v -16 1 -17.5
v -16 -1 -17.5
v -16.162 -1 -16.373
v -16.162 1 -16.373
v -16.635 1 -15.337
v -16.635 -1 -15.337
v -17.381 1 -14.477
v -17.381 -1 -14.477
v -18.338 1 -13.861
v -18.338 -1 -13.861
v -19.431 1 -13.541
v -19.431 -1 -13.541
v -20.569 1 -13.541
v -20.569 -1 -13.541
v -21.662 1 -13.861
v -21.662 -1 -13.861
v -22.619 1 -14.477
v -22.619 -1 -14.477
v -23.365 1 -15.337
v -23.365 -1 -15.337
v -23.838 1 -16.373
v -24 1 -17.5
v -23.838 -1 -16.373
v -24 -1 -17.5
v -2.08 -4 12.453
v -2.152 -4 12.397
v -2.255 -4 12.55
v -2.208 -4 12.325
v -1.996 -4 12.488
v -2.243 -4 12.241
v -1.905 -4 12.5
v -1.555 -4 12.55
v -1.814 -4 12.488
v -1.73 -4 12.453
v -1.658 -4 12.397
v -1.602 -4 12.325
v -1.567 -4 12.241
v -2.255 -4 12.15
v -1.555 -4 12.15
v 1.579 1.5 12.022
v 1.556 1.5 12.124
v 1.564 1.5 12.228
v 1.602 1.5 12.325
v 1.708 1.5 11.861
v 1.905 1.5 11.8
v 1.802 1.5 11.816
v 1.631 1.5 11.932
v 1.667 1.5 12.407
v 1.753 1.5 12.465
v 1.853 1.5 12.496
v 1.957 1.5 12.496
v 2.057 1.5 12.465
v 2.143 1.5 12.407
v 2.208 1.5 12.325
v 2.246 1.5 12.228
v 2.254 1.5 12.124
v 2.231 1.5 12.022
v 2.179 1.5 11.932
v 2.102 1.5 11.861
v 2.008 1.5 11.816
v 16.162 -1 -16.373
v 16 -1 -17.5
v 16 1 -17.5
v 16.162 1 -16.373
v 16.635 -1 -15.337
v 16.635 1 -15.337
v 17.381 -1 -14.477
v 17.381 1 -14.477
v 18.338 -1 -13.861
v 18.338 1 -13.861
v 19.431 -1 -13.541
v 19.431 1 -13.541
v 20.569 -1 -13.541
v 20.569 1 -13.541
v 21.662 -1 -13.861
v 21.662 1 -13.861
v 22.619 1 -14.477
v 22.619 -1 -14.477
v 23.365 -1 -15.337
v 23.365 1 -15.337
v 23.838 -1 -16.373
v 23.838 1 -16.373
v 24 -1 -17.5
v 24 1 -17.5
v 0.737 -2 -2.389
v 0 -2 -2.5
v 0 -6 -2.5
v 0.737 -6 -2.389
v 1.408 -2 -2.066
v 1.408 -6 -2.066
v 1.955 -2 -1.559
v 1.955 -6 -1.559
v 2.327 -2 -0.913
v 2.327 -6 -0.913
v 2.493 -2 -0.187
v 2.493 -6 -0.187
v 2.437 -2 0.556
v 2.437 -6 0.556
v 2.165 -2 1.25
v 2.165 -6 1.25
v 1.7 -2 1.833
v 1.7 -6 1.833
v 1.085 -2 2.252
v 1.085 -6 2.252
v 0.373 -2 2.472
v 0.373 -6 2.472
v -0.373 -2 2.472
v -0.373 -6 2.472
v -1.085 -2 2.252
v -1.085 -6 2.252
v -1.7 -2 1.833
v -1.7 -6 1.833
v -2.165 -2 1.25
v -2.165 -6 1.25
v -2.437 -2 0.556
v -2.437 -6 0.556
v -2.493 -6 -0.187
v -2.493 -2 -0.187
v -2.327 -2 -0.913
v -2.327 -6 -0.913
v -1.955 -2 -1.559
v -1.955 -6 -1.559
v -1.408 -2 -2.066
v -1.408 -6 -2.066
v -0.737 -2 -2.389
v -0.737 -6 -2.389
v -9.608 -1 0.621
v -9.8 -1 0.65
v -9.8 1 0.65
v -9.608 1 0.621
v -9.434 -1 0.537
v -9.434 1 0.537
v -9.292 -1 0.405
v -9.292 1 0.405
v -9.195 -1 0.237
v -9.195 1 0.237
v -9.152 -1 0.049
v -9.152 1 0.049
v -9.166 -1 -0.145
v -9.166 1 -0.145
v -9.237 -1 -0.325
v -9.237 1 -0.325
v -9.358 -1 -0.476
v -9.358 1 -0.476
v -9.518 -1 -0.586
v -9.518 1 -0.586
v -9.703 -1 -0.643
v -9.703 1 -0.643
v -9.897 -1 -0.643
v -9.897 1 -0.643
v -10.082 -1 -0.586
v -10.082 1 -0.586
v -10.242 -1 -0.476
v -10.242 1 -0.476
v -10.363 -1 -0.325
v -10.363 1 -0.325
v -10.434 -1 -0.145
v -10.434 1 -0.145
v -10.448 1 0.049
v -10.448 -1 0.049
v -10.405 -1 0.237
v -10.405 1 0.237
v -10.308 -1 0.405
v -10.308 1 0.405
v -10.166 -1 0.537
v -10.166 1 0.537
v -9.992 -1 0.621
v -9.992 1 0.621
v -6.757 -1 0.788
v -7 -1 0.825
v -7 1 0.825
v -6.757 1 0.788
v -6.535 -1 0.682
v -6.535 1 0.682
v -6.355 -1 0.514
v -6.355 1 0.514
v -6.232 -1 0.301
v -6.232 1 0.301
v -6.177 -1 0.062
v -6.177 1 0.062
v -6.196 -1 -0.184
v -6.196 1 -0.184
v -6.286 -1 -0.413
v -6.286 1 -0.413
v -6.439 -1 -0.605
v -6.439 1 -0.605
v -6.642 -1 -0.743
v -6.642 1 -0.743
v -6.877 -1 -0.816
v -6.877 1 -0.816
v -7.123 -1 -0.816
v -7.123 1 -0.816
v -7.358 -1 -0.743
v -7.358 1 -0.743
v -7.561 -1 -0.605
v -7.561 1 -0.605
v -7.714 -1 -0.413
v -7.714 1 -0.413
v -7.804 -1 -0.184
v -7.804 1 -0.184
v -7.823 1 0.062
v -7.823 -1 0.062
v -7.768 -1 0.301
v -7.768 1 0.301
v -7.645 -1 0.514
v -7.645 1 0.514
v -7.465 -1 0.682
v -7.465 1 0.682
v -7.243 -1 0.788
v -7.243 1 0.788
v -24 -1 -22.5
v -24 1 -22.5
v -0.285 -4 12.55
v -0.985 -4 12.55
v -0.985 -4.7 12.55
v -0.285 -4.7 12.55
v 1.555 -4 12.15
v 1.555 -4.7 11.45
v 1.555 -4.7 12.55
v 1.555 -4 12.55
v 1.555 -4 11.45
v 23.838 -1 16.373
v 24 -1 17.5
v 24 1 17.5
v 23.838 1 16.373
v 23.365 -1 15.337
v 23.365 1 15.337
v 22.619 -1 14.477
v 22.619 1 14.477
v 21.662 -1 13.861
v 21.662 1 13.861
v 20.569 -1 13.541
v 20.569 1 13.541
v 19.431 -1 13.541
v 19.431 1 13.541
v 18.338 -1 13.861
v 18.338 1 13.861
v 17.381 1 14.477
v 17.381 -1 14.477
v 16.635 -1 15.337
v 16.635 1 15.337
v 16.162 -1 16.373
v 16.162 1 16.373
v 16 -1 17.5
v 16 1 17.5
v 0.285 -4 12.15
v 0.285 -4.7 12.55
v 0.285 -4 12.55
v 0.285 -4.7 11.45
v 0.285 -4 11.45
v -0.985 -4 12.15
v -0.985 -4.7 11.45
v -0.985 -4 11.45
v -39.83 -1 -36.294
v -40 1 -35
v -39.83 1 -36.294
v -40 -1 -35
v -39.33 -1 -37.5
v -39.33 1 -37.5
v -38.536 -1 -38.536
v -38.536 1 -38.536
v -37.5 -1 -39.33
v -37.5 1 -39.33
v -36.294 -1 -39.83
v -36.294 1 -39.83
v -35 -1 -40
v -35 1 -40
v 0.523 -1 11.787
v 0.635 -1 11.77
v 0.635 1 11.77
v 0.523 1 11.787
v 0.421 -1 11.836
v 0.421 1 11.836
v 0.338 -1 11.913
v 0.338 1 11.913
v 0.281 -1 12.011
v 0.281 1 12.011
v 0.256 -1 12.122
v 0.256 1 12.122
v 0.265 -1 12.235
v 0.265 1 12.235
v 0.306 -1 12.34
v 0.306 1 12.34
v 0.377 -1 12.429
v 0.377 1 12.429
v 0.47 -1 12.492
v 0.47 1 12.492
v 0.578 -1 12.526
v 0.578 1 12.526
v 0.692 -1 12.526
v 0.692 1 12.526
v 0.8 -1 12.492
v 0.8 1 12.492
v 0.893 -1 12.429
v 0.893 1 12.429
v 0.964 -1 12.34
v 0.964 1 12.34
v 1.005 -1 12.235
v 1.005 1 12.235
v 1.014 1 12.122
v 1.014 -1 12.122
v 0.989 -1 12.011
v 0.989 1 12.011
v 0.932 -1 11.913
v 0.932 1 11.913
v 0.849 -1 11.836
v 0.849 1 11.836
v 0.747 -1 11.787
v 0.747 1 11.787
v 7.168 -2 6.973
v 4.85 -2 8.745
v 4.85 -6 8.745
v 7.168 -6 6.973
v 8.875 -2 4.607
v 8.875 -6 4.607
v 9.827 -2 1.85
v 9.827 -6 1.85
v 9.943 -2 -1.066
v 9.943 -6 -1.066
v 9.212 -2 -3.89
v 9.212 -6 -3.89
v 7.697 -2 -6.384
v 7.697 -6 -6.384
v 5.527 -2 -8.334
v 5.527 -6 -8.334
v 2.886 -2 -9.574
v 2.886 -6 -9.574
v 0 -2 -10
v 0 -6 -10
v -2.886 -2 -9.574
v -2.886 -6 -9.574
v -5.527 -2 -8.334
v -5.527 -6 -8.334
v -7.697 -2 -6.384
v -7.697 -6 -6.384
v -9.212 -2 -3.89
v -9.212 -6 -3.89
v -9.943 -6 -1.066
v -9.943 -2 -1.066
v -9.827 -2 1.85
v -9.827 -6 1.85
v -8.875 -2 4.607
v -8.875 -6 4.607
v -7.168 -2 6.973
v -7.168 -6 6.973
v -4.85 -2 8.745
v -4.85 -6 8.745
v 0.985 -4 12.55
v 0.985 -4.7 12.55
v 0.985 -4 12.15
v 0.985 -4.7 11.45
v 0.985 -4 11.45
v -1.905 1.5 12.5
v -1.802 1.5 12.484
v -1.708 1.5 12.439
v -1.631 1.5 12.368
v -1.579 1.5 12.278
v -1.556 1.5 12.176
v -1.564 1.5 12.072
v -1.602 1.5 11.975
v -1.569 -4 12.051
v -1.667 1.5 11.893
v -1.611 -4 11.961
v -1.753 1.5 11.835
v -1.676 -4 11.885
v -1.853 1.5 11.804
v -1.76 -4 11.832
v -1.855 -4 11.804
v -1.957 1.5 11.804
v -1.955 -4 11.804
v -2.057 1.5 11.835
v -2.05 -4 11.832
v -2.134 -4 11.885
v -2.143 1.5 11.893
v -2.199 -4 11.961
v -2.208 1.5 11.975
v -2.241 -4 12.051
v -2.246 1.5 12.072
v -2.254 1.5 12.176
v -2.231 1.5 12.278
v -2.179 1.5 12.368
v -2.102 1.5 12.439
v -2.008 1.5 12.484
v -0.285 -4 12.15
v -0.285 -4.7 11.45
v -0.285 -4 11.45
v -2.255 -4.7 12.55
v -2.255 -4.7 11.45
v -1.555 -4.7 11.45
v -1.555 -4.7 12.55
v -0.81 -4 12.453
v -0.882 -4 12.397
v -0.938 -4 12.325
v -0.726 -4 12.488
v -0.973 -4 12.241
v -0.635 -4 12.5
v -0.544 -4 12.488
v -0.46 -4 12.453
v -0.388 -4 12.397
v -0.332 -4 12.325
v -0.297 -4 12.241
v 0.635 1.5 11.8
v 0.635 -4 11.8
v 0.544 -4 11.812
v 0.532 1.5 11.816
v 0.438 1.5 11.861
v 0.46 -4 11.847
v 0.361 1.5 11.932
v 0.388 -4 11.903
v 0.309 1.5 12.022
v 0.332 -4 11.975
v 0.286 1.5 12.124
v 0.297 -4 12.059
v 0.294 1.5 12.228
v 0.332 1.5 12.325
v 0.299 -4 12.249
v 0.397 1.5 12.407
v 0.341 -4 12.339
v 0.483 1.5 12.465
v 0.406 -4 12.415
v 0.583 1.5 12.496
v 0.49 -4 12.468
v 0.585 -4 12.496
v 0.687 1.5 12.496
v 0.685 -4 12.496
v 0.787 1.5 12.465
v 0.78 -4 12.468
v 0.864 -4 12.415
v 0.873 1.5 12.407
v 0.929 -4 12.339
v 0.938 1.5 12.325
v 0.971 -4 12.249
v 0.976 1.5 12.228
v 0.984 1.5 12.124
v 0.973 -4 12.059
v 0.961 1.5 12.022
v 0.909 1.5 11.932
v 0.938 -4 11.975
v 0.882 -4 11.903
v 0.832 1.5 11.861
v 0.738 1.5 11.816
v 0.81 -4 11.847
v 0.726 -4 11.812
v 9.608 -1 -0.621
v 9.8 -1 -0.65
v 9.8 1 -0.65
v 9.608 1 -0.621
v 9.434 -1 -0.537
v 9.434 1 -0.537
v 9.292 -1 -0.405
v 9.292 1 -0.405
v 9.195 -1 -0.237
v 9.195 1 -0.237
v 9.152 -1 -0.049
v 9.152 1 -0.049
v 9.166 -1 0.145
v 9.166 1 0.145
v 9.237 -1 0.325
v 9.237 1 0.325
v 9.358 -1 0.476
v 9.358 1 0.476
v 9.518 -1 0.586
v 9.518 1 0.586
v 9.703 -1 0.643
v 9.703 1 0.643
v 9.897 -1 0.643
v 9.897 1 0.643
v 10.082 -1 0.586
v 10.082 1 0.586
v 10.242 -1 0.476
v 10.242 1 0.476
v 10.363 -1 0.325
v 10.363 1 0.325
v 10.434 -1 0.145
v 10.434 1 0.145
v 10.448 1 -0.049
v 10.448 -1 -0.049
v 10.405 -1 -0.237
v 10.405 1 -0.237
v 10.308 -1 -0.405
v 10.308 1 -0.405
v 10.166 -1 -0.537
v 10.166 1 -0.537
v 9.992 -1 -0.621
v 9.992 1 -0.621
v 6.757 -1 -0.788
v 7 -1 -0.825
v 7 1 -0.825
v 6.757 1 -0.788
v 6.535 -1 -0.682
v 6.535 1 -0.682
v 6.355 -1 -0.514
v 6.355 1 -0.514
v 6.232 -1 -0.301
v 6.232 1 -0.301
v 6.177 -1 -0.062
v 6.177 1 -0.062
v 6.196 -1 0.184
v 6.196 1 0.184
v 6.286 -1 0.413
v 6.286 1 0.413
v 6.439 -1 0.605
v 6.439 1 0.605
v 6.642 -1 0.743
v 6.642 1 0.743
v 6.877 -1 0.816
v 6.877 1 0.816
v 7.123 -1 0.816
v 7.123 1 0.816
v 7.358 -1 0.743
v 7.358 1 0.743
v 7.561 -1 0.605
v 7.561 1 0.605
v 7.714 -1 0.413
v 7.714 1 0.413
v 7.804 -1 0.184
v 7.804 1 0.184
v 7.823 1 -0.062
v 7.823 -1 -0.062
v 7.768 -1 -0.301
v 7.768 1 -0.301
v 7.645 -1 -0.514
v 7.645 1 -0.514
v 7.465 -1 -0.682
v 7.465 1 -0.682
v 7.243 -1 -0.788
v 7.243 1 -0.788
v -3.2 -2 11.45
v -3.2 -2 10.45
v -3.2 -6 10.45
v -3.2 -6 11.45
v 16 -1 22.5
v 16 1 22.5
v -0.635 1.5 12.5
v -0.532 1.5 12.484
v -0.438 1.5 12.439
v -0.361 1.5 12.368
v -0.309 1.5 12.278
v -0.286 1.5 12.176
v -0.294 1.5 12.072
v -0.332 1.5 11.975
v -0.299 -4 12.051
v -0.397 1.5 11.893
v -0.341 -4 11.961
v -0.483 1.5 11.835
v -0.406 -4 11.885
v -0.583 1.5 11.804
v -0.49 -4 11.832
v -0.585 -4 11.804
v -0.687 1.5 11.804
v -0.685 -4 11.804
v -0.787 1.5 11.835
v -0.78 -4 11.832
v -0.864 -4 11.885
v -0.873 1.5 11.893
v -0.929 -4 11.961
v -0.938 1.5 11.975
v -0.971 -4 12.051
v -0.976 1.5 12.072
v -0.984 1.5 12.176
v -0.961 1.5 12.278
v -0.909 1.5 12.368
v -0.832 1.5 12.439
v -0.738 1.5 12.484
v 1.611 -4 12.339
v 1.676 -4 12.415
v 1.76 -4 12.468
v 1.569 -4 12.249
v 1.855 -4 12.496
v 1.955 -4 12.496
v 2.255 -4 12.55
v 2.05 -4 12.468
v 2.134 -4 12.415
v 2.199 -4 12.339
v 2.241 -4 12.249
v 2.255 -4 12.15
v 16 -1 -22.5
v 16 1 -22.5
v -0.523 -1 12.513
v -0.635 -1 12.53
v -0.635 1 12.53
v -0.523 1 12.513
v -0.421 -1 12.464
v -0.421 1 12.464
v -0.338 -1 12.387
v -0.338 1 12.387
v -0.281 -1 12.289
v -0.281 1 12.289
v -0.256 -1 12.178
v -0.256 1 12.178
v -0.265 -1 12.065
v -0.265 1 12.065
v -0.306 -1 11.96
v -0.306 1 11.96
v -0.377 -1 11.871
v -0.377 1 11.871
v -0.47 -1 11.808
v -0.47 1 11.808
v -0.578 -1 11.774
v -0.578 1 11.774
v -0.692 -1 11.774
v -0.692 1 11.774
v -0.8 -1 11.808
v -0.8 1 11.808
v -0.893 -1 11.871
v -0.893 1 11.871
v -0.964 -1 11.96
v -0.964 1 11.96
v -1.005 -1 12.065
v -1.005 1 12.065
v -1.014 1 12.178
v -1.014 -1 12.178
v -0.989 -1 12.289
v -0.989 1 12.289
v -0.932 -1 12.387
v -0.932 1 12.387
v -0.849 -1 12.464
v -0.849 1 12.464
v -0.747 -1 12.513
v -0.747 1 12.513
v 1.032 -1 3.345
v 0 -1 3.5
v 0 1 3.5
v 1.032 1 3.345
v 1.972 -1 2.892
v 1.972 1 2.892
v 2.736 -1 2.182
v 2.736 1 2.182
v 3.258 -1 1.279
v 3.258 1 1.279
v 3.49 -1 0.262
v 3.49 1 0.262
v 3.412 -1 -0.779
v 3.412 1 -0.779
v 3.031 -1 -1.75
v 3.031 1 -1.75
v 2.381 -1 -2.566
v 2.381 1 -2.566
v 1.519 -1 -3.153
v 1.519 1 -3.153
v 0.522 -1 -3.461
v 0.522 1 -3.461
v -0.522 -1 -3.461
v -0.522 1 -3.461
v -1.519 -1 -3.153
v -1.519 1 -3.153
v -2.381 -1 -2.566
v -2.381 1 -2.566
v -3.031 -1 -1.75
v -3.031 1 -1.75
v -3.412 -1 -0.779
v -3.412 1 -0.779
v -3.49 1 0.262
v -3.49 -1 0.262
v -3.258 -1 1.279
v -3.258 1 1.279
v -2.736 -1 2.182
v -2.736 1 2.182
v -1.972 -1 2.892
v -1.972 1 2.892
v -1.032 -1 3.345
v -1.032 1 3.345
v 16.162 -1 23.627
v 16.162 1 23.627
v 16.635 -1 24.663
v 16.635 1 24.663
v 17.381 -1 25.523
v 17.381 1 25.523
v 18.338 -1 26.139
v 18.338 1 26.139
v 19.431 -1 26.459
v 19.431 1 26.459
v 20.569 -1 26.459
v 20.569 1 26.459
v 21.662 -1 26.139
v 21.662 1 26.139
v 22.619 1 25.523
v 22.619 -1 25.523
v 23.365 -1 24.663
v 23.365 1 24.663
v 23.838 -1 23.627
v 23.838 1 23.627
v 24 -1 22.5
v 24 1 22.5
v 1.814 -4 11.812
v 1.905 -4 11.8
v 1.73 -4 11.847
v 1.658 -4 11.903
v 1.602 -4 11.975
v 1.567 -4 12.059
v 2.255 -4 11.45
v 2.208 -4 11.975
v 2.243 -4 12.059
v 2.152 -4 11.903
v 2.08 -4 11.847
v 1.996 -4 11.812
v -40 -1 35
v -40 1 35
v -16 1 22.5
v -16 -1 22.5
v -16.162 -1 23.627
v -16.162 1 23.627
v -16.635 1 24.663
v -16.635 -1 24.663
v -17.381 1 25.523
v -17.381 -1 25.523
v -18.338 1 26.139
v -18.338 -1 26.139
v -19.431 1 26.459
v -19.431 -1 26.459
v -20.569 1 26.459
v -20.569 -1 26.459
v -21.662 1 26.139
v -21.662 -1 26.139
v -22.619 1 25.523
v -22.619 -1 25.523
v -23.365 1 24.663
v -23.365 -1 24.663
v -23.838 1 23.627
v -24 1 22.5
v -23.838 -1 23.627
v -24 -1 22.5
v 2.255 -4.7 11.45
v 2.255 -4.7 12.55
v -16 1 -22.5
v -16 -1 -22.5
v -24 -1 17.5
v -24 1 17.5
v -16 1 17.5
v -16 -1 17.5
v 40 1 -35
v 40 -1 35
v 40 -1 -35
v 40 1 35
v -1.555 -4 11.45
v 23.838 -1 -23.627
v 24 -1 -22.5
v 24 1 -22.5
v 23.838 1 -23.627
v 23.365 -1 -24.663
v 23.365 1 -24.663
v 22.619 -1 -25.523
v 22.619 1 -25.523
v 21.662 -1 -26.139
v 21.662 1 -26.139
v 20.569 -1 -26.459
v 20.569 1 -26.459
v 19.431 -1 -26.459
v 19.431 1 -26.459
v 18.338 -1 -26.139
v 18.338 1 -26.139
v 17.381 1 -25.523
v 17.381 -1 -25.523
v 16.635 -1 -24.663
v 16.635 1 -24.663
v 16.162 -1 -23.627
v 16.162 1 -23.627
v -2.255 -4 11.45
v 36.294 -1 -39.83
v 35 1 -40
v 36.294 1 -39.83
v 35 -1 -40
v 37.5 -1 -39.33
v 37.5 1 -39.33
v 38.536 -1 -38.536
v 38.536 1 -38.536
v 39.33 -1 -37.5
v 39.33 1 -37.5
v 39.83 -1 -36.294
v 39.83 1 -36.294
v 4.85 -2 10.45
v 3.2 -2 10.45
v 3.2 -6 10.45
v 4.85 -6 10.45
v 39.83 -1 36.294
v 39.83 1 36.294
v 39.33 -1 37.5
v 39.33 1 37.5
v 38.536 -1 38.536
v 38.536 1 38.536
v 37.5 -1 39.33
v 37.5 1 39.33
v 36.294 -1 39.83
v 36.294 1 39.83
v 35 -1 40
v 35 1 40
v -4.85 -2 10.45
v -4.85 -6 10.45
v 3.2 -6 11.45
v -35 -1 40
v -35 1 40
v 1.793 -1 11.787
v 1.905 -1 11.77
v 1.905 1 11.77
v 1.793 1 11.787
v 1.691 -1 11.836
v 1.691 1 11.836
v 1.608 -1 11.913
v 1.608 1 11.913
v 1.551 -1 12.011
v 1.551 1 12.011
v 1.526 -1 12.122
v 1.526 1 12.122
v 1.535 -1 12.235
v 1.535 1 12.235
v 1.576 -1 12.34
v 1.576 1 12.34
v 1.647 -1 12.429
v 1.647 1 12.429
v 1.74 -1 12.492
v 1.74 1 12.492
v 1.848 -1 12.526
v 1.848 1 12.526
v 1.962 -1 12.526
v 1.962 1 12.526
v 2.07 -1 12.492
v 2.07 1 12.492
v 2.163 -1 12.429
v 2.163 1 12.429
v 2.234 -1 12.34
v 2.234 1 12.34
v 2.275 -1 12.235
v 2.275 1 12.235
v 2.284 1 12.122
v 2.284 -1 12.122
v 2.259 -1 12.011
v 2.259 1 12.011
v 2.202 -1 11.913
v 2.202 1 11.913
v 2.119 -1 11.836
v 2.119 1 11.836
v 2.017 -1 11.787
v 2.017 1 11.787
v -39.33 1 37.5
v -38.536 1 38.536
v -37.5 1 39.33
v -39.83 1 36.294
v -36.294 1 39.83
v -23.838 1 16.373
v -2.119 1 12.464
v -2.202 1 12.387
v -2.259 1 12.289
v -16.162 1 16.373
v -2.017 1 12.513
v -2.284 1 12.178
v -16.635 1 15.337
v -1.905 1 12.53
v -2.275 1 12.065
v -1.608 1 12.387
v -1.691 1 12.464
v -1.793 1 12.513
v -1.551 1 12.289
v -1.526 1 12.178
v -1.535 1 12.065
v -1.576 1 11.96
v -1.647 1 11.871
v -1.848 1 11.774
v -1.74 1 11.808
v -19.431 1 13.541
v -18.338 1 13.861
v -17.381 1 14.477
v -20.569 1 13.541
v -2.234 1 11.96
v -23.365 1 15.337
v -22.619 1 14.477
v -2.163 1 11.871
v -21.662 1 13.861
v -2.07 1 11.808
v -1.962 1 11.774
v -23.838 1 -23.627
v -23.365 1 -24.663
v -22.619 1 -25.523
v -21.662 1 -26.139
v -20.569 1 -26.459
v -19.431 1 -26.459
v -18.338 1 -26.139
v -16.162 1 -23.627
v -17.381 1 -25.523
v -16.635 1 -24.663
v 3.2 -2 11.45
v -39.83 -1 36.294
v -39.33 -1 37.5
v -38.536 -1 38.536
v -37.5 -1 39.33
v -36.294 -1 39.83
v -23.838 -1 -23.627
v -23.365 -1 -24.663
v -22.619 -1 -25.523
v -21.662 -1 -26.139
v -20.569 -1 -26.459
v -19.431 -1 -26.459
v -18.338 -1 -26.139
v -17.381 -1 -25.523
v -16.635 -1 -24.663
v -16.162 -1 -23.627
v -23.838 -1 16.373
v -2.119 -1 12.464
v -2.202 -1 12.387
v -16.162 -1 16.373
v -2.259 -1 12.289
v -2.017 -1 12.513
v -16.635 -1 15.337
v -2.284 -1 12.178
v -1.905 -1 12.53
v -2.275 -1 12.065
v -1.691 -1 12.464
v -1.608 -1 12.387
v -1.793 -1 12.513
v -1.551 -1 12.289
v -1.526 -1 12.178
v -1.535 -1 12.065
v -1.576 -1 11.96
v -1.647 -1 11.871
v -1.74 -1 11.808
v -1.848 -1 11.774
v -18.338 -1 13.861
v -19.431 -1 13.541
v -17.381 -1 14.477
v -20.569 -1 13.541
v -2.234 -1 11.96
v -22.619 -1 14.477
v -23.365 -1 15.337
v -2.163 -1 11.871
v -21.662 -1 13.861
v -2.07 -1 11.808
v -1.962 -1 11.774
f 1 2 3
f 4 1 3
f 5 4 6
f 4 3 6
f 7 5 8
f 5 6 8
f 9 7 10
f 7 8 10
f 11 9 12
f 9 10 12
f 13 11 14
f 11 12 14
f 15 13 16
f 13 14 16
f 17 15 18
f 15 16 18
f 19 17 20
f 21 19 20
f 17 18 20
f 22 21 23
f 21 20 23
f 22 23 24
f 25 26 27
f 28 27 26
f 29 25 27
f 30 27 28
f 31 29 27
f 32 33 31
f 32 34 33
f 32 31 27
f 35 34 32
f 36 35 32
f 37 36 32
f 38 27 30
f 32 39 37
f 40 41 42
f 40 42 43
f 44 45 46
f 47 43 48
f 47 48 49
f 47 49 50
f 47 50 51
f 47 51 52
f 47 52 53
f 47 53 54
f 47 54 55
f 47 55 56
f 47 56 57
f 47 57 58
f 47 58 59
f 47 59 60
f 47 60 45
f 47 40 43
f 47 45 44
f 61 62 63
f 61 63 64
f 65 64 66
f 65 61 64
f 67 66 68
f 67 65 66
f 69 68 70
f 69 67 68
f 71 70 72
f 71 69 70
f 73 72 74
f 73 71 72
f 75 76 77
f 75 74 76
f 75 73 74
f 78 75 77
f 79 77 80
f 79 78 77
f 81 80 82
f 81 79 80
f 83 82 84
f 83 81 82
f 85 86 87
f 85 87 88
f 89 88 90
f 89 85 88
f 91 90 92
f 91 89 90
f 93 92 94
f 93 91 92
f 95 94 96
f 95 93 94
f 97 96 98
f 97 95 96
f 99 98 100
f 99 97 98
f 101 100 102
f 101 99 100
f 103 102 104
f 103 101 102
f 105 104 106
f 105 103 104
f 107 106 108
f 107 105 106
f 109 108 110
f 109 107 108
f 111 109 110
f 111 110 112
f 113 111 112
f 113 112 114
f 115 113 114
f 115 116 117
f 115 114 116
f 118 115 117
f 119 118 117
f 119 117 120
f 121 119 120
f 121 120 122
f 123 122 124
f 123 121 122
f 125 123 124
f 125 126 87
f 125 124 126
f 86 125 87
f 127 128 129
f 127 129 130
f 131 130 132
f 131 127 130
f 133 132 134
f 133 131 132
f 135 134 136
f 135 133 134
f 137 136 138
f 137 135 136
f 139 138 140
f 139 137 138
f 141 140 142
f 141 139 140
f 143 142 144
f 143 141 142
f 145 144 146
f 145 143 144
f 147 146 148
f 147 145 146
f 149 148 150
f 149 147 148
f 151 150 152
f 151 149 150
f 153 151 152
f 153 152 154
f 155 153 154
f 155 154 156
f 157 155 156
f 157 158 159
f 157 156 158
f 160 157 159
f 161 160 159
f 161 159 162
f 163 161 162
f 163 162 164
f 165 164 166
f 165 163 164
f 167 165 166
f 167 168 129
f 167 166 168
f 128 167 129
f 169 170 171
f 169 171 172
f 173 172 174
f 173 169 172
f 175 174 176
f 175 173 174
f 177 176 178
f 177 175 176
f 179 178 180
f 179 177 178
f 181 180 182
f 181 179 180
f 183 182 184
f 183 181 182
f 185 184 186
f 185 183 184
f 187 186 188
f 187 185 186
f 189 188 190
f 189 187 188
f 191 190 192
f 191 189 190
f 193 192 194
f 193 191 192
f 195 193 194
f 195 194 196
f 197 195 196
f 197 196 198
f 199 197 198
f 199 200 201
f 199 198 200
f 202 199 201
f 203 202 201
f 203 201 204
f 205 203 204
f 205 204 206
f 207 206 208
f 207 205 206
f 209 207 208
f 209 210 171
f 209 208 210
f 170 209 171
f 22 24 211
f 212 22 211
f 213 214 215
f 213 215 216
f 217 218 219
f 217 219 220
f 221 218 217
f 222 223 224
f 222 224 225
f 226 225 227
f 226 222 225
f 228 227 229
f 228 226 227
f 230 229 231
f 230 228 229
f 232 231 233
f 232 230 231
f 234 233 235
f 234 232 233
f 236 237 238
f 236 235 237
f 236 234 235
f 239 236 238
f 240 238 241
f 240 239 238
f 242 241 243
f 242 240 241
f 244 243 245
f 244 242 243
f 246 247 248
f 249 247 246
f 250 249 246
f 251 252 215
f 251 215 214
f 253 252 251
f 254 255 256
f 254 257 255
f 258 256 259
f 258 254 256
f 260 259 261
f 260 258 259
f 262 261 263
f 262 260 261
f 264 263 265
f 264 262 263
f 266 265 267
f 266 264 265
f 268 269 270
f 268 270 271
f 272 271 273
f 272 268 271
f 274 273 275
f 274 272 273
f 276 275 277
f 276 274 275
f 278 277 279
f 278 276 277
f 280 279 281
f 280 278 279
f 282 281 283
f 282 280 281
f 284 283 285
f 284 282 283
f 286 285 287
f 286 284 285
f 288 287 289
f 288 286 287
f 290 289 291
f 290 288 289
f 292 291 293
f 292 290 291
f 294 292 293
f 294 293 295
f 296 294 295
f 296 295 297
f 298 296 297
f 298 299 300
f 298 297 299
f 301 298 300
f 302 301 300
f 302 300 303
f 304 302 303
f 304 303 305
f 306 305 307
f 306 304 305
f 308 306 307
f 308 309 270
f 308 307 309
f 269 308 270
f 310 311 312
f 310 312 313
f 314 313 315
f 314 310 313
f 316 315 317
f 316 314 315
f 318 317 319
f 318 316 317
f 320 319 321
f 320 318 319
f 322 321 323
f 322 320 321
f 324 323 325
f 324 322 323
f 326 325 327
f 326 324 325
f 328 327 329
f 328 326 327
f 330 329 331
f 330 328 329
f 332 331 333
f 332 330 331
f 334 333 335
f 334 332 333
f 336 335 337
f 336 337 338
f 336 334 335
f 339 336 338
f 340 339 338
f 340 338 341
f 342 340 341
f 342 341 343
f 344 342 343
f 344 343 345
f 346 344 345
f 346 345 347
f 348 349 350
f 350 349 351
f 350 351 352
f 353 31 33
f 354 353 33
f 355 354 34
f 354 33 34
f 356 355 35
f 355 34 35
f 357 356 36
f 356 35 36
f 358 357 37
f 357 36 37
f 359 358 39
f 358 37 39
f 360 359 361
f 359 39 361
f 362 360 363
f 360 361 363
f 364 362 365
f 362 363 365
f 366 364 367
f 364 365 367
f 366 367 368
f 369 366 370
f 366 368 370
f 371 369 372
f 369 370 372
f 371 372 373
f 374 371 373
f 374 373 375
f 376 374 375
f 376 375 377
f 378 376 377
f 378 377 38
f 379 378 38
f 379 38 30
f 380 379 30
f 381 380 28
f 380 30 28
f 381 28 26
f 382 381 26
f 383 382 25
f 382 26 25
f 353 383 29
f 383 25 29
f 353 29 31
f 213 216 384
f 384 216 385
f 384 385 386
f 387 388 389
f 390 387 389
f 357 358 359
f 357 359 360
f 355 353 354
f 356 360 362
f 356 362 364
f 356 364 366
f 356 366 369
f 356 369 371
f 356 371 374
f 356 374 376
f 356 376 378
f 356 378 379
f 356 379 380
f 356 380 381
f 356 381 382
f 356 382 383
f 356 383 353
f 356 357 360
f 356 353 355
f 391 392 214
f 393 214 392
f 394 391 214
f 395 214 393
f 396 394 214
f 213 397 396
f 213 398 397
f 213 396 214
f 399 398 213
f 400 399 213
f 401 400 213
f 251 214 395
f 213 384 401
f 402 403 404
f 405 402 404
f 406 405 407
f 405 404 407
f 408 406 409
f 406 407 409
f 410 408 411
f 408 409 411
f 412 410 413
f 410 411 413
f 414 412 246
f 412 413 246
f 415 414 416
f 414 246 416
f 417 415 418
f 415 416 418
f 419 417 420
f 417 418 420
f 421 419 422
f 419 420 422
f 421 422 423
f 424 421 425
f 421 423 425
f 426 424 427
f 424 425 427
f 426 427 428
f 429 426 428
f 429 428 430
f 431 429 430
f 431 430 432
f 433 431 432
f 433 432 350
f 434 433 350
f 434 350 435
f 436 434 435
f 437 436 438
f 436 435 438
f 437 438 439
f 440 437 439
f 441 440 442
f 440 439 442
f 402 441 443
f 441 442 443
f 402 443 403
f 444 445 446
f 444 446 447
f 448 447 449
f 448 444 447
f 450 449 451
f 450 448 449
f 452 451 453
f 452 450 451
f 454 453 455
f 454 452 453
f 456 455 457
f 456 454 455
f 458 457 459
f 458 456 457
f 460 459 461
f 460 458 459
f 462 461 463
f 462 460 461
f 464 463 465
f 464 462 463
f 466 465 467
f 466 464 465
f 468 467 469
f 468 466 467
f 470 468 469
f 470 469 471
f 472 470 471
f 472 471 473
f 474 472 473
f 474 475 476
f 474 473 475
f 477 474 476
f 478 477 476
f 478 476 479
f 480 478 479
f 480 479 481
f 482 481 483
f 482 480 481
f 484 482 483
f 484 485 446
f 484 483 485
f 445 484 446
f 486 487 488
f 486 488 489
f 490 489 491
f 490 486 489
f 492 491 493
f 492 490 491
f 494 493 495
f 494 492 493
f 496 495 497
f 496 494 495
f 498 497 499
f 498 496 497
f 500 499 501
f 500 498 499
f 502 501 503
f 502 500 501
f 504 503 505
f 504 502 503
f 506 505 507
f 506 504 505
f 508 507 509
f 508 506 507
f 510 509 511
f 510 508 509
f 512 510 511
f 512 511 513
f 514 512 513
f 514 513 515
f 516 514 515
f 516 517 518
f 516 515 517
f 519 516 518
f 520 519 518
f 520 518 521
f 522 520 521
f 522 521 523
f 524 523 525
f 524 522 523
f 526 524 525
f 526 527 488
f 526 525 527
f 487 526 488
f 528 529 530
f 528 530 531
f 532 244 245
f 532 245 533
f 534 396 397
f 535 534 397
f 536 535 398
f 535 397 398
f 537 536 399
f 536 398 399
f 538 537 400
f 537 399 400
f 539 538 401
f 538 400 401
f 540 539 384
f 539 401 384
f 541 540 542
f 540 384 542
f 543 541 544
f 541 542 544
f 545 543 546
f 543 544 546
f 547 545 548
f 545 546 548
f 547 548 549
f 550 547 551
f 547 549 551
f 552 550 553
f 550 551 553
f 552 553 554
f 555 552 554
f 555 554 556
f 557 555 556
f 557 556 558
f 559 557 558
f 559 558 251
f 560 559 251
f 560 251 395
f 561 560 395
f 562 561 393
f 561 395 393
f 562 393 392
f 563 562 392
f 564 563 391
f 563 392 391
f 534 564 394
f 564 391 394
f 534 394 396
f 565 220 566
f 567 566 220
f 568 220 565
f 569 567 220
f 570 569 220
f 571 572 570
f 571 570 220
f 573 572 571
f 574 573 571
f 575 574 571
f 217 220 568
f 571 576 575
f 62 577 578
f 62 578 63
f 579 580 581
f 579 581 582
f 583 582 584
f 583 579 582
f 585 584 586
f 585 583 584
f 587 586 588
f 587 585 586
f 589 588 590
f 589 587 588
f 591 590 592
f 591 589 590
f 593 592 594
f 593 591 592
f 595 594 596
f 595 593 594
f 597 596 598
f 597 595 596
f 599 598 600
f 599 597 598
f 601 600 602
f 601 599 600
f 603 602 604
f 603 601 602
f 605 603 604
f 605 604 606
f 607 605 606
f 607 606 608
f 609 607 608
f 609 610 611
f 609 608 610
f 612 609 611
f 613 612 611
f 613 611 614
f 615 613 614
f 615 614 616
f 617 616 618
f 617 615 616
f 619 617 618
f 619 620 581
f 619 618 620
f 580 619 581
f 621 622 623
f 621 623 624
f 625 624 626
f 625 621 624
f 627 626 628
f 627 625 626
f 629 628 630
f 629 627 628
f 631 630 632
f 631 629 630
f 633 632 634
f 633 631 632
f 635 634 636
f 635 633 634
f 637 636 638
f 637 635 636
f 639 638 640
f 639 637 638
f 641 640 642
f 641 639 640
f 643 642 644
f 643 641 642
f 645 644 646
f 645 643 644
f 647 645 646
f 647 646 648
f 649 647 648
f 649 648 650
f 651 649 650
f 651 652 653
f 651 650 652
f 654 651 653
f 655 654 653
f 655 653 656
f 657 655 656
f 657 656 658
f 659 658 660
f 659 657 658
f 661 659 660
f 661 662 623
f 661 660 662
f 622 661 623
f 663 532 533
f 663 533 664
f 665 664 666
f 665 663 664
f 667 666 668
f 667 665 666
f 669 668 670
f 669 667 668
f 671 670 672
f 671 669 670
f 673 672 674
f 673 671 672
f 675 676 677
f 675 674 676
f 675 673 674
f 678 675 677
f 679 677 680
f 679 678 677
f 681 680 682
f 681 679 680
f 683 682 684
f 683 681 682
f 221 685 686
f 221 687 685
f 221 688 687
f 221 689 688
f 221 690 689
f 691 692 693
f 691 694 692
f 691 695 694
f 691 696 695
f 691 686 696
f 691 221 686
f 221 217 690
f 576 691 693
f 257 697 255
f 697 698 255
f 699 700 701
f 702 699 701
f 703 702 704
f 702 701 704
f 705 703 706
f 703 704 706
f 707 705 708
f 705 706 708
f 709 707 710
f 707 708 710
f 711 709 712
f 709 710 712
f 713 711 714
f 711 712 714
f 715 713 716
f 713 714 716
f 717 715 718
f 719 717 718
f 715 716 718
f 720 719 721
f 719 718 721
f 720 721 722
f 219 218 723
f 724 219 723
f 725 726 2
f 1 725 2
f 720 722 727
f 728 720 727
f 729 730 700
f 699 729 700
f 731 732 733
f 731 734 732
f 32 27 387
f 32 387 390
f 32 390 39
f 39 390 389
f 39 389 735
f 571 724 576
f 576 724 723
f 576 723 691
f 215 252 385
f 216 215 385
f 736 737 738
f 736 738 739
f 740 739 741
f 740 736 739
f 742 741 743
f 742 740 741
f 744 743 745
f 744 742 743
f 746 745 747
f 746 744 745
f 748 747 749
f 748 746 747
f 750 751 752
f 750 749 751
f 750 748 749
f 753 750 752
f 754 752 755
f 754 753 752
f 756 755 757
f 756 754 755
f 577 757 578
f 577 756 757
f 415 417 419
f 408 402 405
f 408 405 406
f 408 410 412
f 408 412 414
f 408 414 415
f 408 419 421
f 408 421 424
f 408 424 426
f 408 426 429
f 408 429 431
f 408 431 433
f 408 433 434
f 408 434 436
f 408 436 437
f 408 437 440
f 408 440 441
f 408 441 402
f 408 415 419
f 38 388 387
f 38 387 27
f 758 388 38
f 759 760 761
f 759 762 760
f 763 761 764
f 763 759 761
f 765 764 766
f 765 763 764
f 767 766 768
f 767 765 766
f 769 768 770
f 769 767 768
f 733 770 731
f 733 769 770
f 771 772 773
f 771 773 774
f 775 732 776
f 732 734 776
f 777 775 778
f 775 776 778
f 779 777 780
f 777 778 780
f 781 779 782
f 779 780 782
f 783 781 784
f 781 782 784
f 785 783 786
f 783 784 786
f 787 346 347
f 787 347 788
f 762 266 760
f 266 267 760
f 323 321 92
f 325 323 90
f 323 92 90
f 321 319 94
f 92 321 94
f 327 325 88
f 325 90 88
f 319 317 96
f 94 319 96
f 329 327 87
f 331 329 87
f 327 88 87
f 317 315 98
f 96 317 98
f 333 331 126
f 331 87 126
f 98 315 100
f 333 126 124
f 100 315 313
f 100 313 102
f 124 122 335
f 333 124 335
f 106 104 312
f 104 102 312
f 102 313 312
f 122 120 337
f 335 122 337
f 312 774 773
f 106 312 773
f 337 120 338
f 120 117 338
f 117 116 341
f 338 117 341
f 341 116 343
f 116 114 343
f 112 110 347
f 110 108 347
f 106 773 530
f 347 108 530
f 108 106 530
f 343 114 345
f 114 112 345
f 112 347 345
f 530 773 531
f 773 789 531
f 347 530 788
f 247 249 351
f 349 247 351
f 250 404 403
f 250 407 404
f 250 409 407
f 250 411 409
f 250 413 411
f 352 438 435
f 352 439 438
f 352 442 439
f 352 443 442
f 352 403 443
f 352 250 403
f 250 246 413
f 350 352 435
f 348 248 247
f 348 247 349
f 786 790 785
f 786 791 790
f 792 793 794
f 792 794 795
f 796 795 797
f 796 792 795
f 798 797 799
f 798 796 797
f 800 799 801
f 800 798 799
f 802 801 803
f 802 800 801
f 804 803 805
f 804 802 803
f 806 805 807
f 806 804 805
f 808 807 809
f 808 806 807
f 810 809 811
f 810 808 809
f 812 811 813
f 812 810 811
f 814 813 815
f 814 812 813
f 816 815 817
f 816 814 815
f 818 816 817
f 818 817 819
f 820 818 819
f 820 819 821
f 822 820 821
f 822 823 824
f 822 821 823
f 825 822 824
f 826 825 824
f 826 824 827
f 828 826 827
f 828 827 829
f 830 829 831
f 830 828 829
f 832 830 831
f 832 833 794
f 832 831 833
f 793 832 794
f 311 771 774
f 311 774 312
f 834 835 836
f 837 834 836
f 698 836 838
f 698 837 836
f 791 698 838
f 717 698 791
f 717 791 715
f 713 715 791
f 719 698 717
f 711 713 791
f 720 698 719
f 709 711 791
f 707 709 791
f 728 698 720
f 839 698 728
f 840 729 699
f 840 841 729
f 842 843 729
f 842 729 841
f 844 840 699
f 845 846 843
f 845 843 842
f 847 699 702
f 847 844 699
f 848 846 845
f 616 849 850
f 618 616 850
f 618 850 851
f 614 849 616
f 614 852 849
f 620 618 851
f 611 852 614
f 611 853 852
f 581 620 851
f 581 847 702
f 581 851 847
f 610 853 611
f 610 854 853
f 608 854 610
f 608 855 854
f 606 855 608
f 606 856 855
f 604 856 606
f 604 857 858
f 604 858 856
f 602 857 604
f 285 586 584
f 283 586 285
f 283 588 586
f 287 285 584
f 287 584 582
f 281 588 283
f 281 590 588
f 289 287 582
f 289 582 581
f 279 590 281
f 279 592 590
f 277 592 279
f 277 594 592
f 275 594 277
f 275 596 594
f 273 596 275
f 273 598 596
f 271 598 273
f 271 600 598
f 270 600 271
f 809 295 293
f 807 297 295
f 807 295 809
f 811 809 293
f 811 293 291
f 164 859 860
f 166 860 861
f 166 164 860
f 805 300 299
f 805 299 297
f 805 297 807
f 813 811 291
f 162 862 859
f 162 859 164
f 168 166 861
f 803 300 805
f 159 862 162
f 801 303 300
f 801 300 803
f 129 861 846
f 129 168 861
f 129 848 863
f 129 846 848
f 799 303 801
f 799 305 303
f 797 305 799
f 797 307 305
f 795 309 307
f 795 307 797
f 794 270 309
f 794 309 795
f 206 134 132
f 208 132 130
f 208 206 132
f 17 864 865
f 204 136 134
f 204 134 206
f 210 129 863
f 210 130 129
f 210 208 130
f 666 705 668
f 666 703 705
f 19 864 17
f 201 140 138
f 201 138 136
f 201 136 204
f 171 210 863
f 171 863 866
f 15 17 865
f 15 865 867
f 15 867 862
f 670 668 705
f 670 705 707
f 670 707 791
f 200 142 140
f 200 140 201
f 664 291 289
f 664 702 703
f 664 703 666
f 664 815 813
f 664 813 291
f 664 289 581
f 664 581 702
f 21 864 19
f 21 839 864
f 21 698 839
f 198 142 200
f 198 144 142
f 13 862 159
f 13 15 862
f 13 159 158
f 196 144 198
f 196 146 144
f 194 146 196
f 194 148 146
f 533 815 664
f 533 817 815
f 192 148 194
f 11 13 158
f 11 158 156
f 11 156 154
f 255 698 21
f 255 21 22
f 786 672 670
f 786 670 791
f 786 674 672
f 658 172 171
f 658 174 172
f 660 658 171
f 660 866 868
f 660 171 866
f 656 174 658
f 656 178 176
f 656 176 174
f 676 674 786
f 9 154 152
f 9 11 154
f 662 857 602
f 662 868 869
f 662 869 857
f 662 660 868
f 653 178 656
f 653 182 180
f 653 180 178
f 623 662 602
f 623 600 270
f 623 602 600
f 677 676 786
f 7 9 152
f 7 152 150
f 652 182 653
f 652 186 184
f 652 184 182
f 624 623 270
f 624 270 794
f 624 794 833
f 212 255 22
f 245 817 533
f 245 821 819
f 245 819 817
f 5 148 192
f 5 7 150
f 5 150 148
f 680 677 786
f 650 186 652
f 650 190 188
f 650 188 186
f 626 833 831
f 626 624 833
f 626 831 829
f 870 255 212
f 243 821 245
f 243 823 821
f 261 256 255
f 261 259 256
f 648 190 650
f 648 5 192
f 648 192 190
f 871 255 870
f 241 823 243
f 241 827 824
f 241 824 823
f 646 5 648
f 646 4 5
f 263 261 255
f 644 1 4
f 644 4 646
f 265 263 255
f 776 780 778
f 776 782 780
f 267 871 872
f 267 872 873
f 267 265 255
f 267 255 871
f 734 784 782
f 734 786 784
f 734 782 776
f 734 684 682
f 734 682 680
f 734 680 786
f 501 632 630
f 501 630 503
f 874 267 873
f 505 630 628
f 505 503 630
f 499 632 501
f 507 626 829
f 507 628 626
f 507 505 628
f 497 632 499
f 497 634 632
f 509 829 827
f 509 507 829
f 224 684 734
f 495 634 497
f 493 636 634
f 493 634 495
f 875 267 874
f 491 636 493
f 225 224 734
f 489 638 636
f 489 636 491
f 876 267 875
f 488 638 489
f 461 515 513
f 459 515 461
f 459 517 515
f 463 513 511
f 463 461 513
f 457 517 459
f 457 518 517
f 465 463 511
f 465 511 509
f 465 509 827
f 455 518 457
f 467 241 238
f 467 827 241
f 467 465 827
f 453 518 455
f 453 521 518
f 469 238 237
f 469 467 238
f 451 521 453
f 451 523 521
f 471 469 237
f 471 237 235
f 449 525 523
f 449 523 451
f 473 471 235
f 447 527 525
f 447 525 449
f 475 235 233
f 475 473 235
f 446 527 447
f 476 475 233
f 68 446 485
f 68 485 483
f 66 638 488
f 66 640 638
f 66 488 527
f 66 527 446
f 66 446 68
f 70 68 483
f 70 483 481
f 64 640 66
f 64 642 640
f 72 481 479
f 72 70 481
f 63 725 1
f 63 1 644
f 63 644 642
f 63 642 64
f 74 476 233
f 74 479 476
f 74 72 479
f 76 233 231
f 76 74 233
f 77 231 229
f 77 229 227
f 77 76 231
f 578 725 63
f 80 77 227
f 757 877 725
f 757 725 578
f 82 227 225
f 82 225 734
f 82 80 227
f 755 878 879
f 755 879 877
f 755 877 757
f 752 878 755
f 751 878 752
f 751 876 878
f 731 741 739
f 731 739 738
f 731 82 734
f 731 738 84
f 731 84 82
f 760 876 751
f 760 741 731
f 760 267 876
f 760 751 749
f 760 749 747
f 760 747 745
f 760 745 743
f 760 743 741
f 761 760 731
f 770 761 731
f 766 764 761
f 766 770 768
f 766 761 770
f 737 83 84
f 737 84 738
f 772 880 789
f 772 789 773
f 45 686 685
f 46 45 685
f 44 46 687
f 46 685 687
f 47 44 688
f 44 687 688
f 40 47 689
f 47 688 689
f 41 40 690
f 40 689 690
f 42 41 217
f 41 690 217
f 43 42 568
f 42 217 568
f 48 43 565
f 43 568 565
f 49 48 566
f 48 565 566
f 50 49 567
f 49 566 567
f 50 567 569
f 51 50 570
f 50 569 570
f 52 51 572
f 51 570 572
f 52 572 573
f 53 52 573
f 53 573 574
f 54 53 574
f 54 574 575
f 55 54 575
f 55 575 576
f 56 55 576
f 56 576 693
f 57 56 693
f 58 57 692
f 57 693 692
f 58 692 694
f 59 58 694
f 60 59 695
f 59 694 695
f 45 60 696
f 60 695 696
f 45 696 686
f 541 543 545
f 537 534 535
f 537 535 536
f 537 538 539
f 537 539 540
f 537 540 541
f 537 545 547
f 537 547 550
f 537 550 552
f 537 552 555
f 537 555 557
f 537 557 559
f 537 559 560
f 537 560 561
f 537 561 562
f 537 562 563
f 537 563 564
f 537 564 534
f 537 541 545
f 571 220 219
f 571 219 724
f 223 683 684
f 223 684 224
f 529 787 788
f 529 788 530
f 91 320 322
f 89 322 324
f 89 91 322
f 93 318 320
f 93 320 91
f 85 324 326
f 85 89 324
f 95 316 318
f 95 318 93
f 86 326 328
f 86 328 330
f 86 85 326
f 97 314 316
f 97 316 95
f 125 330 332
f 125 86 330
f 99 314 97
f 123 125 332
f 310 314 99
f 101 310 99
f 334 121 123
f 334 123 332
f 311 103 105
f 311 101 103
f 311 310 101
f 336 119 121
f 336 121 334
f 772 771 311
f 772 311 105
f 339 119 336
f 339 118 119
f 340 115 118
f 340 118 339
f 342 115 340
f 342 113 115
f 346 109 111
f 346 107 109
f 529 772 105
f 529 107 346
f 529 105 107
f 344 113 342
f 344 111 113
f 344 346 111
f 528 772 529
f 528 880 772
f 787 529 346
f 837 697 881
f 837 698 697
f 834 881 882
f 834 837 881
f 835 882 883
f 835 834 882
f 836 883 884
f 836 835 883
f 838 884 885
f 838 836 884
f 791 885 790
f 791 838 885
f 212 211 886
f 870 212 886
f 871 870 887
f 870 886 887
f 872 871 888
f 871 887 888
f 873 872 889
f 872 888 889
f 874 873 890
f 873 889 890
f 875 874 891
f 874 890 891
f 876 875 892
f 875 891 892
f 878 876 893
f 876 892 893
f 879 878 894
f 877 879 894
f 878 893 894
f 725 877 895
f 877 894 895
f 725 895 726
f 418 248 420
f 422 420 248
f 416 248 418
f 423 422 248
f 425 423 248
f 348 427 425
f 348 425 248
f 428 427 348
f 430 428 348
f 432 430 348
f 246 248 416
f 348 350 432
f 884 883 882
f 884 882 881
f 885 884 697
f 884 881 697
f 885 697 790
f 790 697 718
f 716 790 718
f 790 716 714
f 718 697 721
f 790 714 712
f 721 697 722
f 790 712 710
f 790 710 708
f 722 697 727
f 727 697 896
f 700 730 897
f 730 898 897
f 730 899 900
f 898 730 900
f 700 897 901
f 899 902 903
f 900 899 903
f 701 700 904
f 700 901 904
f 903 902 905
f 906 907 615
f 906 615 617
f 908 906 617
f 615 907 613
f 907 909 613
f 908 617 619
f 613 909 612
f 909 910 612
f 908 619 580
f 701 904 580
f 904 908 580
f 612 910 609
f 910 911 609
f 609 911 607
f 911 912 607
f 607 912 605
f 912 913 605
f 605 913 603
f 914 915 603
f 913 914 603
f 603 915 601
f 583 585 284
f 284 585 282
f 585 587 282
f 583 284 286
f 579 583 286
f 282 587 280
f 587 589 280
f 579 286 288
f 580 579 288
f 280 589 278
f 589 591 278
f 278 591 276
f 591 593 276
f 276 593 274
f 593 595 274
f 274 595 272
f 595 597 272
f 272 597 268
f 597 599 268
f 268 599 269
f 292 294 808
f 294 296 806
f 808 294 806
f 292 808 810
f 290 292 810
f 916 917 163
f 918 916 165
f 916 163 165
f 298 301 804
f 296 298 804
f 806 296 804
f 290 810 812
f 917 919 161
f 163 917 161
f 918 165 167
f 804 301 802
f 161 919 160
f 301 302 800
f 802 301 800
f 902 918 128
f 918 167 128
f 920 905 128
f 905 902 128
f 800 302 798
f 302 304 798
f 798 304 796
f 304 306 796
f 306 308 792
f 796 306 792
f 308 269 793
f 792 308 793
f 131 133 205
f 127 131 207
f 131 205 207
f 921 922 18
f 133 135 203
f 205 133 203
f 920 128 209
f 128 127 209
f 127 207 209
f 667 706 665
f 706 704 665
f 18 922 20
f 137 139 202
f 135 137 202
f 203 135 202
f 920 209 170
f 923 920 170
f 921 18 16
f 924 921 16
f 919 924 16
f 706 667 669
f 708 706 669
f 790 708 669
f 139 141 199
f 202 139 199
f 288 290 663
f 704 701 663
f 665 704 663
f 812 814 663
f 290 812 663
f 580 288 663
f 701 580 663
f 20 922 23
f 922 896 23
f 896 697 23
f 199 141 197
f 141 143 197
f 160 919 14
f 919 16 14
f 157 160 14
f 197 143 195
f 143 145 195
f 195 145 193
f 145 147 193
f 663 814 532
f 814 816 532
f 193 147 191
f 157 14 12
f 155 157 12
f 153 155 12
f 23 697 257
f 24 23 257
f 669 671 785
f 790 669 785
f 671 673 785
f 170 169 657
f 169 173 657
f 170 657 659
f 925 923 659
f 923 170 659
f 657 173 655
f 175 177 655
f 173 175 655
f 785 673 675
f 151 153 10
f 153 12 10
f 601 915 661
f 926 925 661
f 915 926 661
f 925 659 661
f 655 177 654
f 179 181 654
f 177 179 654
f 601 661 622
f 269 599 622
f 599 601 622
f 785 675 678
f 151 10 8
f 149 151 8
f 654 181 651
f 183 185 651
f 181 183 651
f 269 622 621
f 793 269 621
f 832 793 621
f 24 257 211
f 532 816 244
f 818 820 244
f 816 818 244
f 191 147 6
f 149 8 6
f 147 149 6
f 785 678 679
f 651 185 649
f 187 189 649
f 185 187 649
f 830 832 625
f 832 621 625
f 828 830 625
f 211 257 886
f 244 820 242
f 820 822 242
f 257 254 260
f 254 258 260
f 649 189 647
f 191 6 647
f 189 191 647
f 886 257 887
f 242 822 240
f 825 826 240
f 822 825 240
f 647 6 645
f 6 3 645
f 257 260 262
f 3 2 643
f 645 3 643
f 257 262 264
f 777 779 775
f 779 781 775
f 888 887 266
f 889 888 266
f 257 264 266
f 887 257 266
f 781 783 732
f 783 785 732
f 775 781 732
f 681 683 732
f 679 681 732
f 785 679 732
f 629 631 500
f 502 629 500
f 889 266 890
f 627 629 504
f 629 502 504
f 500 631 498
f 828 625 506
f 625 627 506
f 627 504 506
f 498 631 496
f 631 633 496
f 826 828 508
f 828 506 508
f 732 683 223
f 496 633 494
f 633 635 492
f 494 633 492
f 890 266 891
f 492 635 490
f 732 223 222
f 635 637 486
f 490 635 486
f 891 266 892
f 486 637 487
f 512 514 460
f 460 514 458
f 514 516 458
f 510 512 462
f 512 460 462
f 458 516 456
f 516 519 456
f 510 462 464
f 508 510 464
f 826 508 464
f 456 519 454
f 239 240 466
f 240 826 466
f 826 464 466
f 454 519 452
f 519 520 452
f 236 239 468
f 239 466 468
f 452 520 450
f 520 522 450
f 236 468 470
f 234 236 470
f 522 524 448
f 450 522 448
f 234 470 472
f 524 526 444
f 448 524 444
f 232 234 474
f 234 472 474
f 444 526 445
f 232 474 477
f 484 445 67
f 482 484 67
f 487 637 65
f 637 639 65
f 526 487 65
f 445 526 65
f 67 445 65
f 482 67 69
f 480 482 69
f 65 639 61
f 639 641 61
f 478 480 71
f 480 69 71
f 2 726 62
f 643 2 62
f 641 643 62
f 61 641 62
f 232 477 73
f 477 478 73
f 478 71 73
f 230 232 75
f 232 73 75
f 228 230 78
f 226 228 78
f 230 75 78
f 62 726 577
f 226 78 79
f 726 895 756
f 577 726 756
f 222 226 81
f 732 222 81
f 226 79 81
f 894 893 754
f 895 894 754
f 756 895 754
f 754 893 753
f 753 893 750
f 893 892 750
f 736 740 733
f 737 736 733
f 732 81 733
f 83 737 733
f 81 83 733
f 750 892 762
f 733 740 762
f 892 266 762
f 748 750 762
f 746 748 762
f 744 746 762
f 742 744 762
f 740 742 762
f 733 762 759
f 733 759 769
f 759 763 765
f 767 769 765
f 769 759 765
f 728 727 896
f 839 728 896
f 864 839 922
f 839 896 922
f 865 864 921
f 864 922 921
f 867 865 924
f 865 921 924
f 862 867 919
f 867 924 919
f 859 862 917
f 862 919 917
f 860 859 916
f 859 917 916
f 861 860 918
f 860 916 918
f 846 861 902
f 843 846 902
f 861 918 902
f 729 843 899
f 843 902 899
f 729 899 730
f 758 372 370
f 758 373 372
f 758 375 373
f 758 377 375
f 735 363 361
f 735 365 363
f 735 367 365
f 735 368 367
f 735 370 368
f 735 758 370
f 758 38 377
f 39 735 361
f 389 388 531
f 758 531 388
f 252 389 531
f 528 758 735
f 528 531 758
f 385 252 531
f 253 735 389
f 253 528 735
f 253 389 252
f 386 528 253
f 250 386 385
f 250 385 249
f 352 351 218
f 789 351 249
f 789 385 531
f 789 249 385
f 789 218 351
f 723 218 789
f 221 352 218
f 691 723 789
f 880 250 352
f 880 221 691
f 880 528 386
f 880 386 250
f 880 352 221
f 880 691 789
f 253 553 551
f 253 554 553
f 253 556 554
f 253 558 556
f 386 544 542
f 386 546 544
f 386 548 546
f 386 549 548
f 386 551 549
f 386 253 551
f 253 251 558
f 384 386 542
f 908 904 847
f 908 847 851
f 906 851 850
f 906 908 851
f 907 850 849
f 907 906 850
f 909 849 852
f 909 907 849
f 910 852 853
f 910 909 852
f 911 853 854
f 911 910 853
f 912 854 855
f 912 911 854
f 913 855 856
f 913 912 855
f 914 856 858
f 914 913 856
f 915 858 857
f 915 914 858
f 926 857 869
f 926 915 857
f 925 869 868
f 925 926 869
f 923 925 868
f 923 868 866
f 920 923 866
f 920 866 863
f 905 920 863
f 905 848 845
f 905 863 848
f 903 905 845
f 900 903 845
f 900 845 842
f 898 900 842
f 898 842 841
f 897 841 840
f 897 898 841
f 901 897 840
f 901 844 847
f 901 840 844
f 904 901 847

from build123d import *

# Parameters (mm, degrees)
SKETCH1_W                  = 80
SKETCH1_H                  = 80
BOSS_EXTRUDE1_DEPTH        = 1
FILLET1_R                  = 5
FILLET3_R                  = 5
FILLET4_R                  = 5
FILLET5_R                  = 5
CUT_EXTRUDE1_DEPTH         = 57.603886792
CUT_EXTRUDE1_DEPTH_BACK    = 57.603886792
CUT_EXTRUDE2_DEPTH         = 57.603886792
CUT_EXTRUDE2_DEPTH_BACK    = 57.603886792
SKETCH3_R                  = 3.5
CUT_EXTRUDE3_DEPTH         = 57.603886792
CUT_EXTRUDE3_DEPTH_BACK    = 57.603886792
SKETCH4_R                  = 0.38
SKETCH4_R_2                = 0.65
SKETCH4_R_3                = 0.825
BOSS_EXTRUDE2_START        = 1
BOSS_EXTRUDE2_DEPTH        = 4
BOSS_EXTRUDE3_DEPTH        = 0.5
BOSS_EXTRUDE3_DEPTH_BACK   = 5
SKETCH7_R                  = 0.35
BOSS_EXTRUDE3_2_DEPTH      = 0.5
BOSS_EXTRUDE3_2_DEPTH_BACK = 5
BOSS_EXTRUDE3_3_DEPTH      = 0.5
BOSS_EXTRUDE3_3_DEPTH_BACK = 5
BOSS_EXTRUDE3_4_DEPTH      = 0.5
BOSS_EXTRUDE3_4_DEPTH_BACK = 5
SKETCH8_W                  = 0.7
SKETCH8_H                  = 0.7
BOSS_EXTRUDE4_DEPTH        = 1.1
CUT_EXTRUDE4_DEPTH         = 58.063561053
CUT_EXTRUDE4_DEPTH_BACK    = 58.063561053
SKETCH9_R                  = 2.5


with BuildPart() as part:
    # Sketch1 → Boss-Extrude1 (new, symmetric)
    with BuildSketch(Plane(origin=(0, 0, 0), x_dir=(1, 0, 0), z_dir=(0, 1, 0))):
        Rectangle(SKETCH1_W, SKETCH1_H)
    extrude(amount=BOSS_EXTRUDE1_DEPTH, both=True)

    # Fillet1
    fillet1_edges = [part.edges().sort_by_distance(p)[0] for p in [
        (-40, 0, 40),
    ]]
    fillet(fillet1_edges, radius=FILLET1_R)

    # Fillet3
    fillet3_edges = [part.edges().sort_by_distance(p)[0] for p in [
        (-40, 0, -40),
    ]]
    fillet(fillet3_edges, radius=FILLET3_R)

    # Fillet4
    fillet4_edges = [part.edges().sort_by_distance(p)[0] for p in [
        (40, 0, -40),
    ]]
    fillet(fillet4_edges, radius=FILLET4_R)

    # Fillet5
    fillet5_edges = [part.edges().sort_by_distance(p)[0] for p in [
        (40, 0, 40),
    ]]
    fillet(fillet5_edges, radius=FILLET5_R)

    # Sketch2 → Cut-Extrude1 (cut, two sides: drawn at the far end of the back side and taken through both)
    with BuildSketch(Plane(origin=(0, 1, 0), x_dir=(1, 0, 0), z_dir=(0, 1, 0)).offset(-CUT_EXTRUDE1_DEPTH_BACK)):
        with BuildLine():
            Line((-24, 17.5), (-24, 22.5))
            ThreePointArc((-24, 22.5), (-20, 26.5), (-16, 22.5))
            Line((-16, 22.5), (-16, 17.5))
            ThreePointArc((-16, 17.5), (-20, 13.5), (-24, 17.5))
        make_face()
        with BuildLine():
            Line((-16, -17.5), (-16, -22.5))
            ThreePointArc((-16, -22.5), (-20, -26.5), (-24, -22.5))
            Line((-24, -22.5), (-24, -17.5))
            ThreePointArc((-24, -17.5), (-20, -13.5), (-16, -17.5))
        make_face()
        with BuildLine():
            Line((16, -17.5), (16, -22.5))
            ThreePointArc((16, -22.5), (20, -26.5), (24, -22.5))
            Line((24, -22.5), (24, -17.5))
            ThreePointArc((24, -17.5), (20, -13.5), (16, -17.5))
        make_face()
        with BuildLine():
            Line((24, 17.5), (24, 22.5))
            ThreePointArc((24, 22.5), (20, 26.5), (16, 22.5))
            Line((16, 22.5), (16, 17.5))
            ThreePointArc((16, 17.5), (20, 13.5), (24, 17.5))
        make_face()
    extrude(amount=CUT_EXTRUDE1_DEPTH + CUT_EXTRUDE1_DEPTH_BACK, mode=Mode.SUBTRACT)

    # Sketch3 → Cut-Extrude2 (cut, two sides: drawn at the far end of the back side and taken through both)
    with BuildSketch(Plane(origin=(0, 1, 0), x_dir=(1, 0, 0), z_dir=(0, 1, 0)).offset(-CUT_EXTRUDE2_DEPTH_BACK)):
        with Locations(Location((0, 0, 0), (0, 0, 270))):
            Circle(SKETCH3_R)
    extrude(amount=CUT_EXTRUDE2_DEPTH + CUT_EXTRUDE2_DEPTH_BACK, mode=Mode.SUBTRACT)

    # Sketch4 → Cut-Extrude3 (cut, two sides: drawn at the far end of the back side and taken through both)
    with BuildSketch(Plane(origin=(0, 1, 0), x_dir=(1, 0, 0), z_dir=(0, 1, 0)).offset(-CUT_EXTRUDE3_DEPTH_BACK)):
        with Locations(Location((-0.635, -12.15, 0), (0, 0, 270))):
            Circle(SKETCH4_R)
        with Locations(Location((-1.905, -12.15, 0), (0, 0, 270))):
            Circle(SKETCH4_R)
        with Locations(Location((-9.8, 0, 0), (0, 0, 270))):
            Circle(SKETCH4_R_2)
        with Locations(Location((-7, 0, 0), (0, 0, 270))):
            Circle(SKETCH4_R_3)
        with Locations(Location((7, 0, 0), (0, 0, 90))):
            Circle(SKETCH4_R_3)
        with Locations(Location((9.8, 0, 0), (0, 0, 90))):
            Circle(SKETCH4_R_2)
        with Locations(Location((0.635, -12.15, 0), (0, 0, 90))):
            Circle(SKETCH4_R)
        with Locations(Location((1.905, -12.15, 0), (0, 0, 90))):
            Circle(SKETCH4_R)
    extrude(amount=CUT_EXTRUDE3_DEPTH + CUT_EXTRUDE3_DEPTH_BACK, mode=Mode.SUBTRACT)


with BuildPart() as body_2:
    # Sketch6 → Boss-Extrude2 (new body)
    with BuildSketch(Plane.XZ.offset(1).offset(BOSS_EXTRUDE2_START)):
        with BuildLine():
            Line((-4.85, 8.745141508), (-4.85, 10.45))
            Line((-4.85, 10.45), (-3.2, 10.45))
            Line((-3.2, 10.45), (-3.2, 11.45))
            Line((-3.2, 11.45), (3.2, 11.45))
            Line((3.2, 11.45), (3.2, 10.45))
            Line((3.2, 10.45), (4.85, 10.45))
            Line((4.85, 10.45), (4.85, 8.745141508))
            ThreePointArc((4.85, 8.745141508), (0, -10), (-4.85, 8.745141508))
        make_face()
    extrude(amount=BOSS_EXTRUDE2_DEPTH)



with BuildPart() as body_3:
    # Sketch7 → Boss-Extrude3 (new, two sides: drawn at the far end of the back side and taken through both)
    with BuildSketch(Plane(origin=(0, 1, 0), x_dir=(1, 0, 0), z_dir=(0, 1, 0)).offset(-BOSS_EXTRUDE3_DEPTH_BACK)):
        with Locations(Location((-1.905, -12.15, 0), (0, 0, 270))):
            Circle(SKETCH7_R)
    extrude(amount=BOSS_EXTRUDE3_DEPTH + BOSS_EXTRUDE3_DEPTH_BACK)


with BuildPart() as body_4:
    # Sketch7 → Boss-Extrude3 2 (new, two sides: drawn at the far end of the back side and taken through both)
    with BuildSketch(Plane(origin=(0, 1, 0), x_dir=(1, 0, 0), z_dir=(0, 1, 0)).offset(-BOSS_EXTRUDE3_2_DEPTH_BACK)):
        with Locations(Location((-0.635, -12.15, 0), (0, 0, 270))):
            Circle(SKETCH7_R)
    extrude(amount=BOSS_EXTRUDE3_2_DEPTH + BOSS_EXTRUDE3_2_DEPTH_BACK)


with BuildPart() as body_5:
    # Sketch7 → Boss-Extrude3 3 (new, two sides: drawn at the far end of the back side and taken through both)
    with BuildSketch(Plane(origin=(0, 1, 0), x_dir=(1, 0, 0), z_dir=(0, 1, 0)).offset(-BOSS_EXTRUDE3_3_DEPTH_BACK)):
        with Locations(Location((0.635, -12.15, 0), (0, 0, 90))):
            Circle(SKETCH7_R)
    extrude(amount=BOSS_EXTRUDE3_3_DEPTH + BOSS_EXTRUDE3_3_DEPTH_BACK)


with BuildPart() as body_6:
    # Sketch7 → Boss-Extrude3 4 (new, two sides: drawn at the far end of the back side and taken through both)
    with BuildSketch(Plane(origin=(0, 1, 0), x_dir=(1, 0, 0), z_dir=(0, 1, 0)).offset(-BOSS_EXTRUDE3_4_DEPTH_BACK)):
        with Locations(Location((1.905, -12.15, 0), (0, 0, 90))):
            Circle(SKETCH7_R)
    extrude(amount=BOSS_EXTRUDE3_4_DEPTH + BOSS_EXTRUDE3_4_DEPTH_BACK)


with BuildPart() as body_2_1:
    add(body_2.part)

    add(body_3.part)  # Boss-Extrude4 merges body 3

    add(body_4.part)  # Boss-Extrude4 merges body 4

    add(body_5.part)  # Boss-Extrude4 merges body 5

    add(body_6.part)  # Boss-Extrude4 merges body 6
    # Sketch8 → Boss-Extrude4 (add)
    with BuildSketch(Plane.XY.offset(11.45)):
        with Locations((-1.905, -4.35)):
            Rectangle(SKETCH8_W, SKETCH8_H)
        with Locations((-0.635, -4.35)):
            Rectangle(SKETCH8_W, SKETCH8_H)
        with Locations((0.635, -4.35)):
            Rectangle(SKETCH8_W, SKETCH8_H)
        with Locations((1.905, -4.35)):
            Rectangle(SKETCH8_W, SKETCH8_H)
    extrude(amount=BOSS_EXTRUDE4_DEPTH)

    # Sketch9 → Cut-Extrude4 (cut, two sides: drawn at the far end of the back side and taken through both)
    with BuildSketch(Plane.XZ.offset(6).offset(-CUT_EXTRUDE4_DEPTH_BACK)):
        with Locations(Location((0, 0, 0), (0, 0, 270))):
            Circle(SKETCH9_R)
    extrude(amount=CUT_EXTRUDE4_DEPTH + CUT_EXTRUDE4_DEPTH_BACK, mode=Mode.SUBTRACT)


solid = Compound([part.part, body_2_1.part])
